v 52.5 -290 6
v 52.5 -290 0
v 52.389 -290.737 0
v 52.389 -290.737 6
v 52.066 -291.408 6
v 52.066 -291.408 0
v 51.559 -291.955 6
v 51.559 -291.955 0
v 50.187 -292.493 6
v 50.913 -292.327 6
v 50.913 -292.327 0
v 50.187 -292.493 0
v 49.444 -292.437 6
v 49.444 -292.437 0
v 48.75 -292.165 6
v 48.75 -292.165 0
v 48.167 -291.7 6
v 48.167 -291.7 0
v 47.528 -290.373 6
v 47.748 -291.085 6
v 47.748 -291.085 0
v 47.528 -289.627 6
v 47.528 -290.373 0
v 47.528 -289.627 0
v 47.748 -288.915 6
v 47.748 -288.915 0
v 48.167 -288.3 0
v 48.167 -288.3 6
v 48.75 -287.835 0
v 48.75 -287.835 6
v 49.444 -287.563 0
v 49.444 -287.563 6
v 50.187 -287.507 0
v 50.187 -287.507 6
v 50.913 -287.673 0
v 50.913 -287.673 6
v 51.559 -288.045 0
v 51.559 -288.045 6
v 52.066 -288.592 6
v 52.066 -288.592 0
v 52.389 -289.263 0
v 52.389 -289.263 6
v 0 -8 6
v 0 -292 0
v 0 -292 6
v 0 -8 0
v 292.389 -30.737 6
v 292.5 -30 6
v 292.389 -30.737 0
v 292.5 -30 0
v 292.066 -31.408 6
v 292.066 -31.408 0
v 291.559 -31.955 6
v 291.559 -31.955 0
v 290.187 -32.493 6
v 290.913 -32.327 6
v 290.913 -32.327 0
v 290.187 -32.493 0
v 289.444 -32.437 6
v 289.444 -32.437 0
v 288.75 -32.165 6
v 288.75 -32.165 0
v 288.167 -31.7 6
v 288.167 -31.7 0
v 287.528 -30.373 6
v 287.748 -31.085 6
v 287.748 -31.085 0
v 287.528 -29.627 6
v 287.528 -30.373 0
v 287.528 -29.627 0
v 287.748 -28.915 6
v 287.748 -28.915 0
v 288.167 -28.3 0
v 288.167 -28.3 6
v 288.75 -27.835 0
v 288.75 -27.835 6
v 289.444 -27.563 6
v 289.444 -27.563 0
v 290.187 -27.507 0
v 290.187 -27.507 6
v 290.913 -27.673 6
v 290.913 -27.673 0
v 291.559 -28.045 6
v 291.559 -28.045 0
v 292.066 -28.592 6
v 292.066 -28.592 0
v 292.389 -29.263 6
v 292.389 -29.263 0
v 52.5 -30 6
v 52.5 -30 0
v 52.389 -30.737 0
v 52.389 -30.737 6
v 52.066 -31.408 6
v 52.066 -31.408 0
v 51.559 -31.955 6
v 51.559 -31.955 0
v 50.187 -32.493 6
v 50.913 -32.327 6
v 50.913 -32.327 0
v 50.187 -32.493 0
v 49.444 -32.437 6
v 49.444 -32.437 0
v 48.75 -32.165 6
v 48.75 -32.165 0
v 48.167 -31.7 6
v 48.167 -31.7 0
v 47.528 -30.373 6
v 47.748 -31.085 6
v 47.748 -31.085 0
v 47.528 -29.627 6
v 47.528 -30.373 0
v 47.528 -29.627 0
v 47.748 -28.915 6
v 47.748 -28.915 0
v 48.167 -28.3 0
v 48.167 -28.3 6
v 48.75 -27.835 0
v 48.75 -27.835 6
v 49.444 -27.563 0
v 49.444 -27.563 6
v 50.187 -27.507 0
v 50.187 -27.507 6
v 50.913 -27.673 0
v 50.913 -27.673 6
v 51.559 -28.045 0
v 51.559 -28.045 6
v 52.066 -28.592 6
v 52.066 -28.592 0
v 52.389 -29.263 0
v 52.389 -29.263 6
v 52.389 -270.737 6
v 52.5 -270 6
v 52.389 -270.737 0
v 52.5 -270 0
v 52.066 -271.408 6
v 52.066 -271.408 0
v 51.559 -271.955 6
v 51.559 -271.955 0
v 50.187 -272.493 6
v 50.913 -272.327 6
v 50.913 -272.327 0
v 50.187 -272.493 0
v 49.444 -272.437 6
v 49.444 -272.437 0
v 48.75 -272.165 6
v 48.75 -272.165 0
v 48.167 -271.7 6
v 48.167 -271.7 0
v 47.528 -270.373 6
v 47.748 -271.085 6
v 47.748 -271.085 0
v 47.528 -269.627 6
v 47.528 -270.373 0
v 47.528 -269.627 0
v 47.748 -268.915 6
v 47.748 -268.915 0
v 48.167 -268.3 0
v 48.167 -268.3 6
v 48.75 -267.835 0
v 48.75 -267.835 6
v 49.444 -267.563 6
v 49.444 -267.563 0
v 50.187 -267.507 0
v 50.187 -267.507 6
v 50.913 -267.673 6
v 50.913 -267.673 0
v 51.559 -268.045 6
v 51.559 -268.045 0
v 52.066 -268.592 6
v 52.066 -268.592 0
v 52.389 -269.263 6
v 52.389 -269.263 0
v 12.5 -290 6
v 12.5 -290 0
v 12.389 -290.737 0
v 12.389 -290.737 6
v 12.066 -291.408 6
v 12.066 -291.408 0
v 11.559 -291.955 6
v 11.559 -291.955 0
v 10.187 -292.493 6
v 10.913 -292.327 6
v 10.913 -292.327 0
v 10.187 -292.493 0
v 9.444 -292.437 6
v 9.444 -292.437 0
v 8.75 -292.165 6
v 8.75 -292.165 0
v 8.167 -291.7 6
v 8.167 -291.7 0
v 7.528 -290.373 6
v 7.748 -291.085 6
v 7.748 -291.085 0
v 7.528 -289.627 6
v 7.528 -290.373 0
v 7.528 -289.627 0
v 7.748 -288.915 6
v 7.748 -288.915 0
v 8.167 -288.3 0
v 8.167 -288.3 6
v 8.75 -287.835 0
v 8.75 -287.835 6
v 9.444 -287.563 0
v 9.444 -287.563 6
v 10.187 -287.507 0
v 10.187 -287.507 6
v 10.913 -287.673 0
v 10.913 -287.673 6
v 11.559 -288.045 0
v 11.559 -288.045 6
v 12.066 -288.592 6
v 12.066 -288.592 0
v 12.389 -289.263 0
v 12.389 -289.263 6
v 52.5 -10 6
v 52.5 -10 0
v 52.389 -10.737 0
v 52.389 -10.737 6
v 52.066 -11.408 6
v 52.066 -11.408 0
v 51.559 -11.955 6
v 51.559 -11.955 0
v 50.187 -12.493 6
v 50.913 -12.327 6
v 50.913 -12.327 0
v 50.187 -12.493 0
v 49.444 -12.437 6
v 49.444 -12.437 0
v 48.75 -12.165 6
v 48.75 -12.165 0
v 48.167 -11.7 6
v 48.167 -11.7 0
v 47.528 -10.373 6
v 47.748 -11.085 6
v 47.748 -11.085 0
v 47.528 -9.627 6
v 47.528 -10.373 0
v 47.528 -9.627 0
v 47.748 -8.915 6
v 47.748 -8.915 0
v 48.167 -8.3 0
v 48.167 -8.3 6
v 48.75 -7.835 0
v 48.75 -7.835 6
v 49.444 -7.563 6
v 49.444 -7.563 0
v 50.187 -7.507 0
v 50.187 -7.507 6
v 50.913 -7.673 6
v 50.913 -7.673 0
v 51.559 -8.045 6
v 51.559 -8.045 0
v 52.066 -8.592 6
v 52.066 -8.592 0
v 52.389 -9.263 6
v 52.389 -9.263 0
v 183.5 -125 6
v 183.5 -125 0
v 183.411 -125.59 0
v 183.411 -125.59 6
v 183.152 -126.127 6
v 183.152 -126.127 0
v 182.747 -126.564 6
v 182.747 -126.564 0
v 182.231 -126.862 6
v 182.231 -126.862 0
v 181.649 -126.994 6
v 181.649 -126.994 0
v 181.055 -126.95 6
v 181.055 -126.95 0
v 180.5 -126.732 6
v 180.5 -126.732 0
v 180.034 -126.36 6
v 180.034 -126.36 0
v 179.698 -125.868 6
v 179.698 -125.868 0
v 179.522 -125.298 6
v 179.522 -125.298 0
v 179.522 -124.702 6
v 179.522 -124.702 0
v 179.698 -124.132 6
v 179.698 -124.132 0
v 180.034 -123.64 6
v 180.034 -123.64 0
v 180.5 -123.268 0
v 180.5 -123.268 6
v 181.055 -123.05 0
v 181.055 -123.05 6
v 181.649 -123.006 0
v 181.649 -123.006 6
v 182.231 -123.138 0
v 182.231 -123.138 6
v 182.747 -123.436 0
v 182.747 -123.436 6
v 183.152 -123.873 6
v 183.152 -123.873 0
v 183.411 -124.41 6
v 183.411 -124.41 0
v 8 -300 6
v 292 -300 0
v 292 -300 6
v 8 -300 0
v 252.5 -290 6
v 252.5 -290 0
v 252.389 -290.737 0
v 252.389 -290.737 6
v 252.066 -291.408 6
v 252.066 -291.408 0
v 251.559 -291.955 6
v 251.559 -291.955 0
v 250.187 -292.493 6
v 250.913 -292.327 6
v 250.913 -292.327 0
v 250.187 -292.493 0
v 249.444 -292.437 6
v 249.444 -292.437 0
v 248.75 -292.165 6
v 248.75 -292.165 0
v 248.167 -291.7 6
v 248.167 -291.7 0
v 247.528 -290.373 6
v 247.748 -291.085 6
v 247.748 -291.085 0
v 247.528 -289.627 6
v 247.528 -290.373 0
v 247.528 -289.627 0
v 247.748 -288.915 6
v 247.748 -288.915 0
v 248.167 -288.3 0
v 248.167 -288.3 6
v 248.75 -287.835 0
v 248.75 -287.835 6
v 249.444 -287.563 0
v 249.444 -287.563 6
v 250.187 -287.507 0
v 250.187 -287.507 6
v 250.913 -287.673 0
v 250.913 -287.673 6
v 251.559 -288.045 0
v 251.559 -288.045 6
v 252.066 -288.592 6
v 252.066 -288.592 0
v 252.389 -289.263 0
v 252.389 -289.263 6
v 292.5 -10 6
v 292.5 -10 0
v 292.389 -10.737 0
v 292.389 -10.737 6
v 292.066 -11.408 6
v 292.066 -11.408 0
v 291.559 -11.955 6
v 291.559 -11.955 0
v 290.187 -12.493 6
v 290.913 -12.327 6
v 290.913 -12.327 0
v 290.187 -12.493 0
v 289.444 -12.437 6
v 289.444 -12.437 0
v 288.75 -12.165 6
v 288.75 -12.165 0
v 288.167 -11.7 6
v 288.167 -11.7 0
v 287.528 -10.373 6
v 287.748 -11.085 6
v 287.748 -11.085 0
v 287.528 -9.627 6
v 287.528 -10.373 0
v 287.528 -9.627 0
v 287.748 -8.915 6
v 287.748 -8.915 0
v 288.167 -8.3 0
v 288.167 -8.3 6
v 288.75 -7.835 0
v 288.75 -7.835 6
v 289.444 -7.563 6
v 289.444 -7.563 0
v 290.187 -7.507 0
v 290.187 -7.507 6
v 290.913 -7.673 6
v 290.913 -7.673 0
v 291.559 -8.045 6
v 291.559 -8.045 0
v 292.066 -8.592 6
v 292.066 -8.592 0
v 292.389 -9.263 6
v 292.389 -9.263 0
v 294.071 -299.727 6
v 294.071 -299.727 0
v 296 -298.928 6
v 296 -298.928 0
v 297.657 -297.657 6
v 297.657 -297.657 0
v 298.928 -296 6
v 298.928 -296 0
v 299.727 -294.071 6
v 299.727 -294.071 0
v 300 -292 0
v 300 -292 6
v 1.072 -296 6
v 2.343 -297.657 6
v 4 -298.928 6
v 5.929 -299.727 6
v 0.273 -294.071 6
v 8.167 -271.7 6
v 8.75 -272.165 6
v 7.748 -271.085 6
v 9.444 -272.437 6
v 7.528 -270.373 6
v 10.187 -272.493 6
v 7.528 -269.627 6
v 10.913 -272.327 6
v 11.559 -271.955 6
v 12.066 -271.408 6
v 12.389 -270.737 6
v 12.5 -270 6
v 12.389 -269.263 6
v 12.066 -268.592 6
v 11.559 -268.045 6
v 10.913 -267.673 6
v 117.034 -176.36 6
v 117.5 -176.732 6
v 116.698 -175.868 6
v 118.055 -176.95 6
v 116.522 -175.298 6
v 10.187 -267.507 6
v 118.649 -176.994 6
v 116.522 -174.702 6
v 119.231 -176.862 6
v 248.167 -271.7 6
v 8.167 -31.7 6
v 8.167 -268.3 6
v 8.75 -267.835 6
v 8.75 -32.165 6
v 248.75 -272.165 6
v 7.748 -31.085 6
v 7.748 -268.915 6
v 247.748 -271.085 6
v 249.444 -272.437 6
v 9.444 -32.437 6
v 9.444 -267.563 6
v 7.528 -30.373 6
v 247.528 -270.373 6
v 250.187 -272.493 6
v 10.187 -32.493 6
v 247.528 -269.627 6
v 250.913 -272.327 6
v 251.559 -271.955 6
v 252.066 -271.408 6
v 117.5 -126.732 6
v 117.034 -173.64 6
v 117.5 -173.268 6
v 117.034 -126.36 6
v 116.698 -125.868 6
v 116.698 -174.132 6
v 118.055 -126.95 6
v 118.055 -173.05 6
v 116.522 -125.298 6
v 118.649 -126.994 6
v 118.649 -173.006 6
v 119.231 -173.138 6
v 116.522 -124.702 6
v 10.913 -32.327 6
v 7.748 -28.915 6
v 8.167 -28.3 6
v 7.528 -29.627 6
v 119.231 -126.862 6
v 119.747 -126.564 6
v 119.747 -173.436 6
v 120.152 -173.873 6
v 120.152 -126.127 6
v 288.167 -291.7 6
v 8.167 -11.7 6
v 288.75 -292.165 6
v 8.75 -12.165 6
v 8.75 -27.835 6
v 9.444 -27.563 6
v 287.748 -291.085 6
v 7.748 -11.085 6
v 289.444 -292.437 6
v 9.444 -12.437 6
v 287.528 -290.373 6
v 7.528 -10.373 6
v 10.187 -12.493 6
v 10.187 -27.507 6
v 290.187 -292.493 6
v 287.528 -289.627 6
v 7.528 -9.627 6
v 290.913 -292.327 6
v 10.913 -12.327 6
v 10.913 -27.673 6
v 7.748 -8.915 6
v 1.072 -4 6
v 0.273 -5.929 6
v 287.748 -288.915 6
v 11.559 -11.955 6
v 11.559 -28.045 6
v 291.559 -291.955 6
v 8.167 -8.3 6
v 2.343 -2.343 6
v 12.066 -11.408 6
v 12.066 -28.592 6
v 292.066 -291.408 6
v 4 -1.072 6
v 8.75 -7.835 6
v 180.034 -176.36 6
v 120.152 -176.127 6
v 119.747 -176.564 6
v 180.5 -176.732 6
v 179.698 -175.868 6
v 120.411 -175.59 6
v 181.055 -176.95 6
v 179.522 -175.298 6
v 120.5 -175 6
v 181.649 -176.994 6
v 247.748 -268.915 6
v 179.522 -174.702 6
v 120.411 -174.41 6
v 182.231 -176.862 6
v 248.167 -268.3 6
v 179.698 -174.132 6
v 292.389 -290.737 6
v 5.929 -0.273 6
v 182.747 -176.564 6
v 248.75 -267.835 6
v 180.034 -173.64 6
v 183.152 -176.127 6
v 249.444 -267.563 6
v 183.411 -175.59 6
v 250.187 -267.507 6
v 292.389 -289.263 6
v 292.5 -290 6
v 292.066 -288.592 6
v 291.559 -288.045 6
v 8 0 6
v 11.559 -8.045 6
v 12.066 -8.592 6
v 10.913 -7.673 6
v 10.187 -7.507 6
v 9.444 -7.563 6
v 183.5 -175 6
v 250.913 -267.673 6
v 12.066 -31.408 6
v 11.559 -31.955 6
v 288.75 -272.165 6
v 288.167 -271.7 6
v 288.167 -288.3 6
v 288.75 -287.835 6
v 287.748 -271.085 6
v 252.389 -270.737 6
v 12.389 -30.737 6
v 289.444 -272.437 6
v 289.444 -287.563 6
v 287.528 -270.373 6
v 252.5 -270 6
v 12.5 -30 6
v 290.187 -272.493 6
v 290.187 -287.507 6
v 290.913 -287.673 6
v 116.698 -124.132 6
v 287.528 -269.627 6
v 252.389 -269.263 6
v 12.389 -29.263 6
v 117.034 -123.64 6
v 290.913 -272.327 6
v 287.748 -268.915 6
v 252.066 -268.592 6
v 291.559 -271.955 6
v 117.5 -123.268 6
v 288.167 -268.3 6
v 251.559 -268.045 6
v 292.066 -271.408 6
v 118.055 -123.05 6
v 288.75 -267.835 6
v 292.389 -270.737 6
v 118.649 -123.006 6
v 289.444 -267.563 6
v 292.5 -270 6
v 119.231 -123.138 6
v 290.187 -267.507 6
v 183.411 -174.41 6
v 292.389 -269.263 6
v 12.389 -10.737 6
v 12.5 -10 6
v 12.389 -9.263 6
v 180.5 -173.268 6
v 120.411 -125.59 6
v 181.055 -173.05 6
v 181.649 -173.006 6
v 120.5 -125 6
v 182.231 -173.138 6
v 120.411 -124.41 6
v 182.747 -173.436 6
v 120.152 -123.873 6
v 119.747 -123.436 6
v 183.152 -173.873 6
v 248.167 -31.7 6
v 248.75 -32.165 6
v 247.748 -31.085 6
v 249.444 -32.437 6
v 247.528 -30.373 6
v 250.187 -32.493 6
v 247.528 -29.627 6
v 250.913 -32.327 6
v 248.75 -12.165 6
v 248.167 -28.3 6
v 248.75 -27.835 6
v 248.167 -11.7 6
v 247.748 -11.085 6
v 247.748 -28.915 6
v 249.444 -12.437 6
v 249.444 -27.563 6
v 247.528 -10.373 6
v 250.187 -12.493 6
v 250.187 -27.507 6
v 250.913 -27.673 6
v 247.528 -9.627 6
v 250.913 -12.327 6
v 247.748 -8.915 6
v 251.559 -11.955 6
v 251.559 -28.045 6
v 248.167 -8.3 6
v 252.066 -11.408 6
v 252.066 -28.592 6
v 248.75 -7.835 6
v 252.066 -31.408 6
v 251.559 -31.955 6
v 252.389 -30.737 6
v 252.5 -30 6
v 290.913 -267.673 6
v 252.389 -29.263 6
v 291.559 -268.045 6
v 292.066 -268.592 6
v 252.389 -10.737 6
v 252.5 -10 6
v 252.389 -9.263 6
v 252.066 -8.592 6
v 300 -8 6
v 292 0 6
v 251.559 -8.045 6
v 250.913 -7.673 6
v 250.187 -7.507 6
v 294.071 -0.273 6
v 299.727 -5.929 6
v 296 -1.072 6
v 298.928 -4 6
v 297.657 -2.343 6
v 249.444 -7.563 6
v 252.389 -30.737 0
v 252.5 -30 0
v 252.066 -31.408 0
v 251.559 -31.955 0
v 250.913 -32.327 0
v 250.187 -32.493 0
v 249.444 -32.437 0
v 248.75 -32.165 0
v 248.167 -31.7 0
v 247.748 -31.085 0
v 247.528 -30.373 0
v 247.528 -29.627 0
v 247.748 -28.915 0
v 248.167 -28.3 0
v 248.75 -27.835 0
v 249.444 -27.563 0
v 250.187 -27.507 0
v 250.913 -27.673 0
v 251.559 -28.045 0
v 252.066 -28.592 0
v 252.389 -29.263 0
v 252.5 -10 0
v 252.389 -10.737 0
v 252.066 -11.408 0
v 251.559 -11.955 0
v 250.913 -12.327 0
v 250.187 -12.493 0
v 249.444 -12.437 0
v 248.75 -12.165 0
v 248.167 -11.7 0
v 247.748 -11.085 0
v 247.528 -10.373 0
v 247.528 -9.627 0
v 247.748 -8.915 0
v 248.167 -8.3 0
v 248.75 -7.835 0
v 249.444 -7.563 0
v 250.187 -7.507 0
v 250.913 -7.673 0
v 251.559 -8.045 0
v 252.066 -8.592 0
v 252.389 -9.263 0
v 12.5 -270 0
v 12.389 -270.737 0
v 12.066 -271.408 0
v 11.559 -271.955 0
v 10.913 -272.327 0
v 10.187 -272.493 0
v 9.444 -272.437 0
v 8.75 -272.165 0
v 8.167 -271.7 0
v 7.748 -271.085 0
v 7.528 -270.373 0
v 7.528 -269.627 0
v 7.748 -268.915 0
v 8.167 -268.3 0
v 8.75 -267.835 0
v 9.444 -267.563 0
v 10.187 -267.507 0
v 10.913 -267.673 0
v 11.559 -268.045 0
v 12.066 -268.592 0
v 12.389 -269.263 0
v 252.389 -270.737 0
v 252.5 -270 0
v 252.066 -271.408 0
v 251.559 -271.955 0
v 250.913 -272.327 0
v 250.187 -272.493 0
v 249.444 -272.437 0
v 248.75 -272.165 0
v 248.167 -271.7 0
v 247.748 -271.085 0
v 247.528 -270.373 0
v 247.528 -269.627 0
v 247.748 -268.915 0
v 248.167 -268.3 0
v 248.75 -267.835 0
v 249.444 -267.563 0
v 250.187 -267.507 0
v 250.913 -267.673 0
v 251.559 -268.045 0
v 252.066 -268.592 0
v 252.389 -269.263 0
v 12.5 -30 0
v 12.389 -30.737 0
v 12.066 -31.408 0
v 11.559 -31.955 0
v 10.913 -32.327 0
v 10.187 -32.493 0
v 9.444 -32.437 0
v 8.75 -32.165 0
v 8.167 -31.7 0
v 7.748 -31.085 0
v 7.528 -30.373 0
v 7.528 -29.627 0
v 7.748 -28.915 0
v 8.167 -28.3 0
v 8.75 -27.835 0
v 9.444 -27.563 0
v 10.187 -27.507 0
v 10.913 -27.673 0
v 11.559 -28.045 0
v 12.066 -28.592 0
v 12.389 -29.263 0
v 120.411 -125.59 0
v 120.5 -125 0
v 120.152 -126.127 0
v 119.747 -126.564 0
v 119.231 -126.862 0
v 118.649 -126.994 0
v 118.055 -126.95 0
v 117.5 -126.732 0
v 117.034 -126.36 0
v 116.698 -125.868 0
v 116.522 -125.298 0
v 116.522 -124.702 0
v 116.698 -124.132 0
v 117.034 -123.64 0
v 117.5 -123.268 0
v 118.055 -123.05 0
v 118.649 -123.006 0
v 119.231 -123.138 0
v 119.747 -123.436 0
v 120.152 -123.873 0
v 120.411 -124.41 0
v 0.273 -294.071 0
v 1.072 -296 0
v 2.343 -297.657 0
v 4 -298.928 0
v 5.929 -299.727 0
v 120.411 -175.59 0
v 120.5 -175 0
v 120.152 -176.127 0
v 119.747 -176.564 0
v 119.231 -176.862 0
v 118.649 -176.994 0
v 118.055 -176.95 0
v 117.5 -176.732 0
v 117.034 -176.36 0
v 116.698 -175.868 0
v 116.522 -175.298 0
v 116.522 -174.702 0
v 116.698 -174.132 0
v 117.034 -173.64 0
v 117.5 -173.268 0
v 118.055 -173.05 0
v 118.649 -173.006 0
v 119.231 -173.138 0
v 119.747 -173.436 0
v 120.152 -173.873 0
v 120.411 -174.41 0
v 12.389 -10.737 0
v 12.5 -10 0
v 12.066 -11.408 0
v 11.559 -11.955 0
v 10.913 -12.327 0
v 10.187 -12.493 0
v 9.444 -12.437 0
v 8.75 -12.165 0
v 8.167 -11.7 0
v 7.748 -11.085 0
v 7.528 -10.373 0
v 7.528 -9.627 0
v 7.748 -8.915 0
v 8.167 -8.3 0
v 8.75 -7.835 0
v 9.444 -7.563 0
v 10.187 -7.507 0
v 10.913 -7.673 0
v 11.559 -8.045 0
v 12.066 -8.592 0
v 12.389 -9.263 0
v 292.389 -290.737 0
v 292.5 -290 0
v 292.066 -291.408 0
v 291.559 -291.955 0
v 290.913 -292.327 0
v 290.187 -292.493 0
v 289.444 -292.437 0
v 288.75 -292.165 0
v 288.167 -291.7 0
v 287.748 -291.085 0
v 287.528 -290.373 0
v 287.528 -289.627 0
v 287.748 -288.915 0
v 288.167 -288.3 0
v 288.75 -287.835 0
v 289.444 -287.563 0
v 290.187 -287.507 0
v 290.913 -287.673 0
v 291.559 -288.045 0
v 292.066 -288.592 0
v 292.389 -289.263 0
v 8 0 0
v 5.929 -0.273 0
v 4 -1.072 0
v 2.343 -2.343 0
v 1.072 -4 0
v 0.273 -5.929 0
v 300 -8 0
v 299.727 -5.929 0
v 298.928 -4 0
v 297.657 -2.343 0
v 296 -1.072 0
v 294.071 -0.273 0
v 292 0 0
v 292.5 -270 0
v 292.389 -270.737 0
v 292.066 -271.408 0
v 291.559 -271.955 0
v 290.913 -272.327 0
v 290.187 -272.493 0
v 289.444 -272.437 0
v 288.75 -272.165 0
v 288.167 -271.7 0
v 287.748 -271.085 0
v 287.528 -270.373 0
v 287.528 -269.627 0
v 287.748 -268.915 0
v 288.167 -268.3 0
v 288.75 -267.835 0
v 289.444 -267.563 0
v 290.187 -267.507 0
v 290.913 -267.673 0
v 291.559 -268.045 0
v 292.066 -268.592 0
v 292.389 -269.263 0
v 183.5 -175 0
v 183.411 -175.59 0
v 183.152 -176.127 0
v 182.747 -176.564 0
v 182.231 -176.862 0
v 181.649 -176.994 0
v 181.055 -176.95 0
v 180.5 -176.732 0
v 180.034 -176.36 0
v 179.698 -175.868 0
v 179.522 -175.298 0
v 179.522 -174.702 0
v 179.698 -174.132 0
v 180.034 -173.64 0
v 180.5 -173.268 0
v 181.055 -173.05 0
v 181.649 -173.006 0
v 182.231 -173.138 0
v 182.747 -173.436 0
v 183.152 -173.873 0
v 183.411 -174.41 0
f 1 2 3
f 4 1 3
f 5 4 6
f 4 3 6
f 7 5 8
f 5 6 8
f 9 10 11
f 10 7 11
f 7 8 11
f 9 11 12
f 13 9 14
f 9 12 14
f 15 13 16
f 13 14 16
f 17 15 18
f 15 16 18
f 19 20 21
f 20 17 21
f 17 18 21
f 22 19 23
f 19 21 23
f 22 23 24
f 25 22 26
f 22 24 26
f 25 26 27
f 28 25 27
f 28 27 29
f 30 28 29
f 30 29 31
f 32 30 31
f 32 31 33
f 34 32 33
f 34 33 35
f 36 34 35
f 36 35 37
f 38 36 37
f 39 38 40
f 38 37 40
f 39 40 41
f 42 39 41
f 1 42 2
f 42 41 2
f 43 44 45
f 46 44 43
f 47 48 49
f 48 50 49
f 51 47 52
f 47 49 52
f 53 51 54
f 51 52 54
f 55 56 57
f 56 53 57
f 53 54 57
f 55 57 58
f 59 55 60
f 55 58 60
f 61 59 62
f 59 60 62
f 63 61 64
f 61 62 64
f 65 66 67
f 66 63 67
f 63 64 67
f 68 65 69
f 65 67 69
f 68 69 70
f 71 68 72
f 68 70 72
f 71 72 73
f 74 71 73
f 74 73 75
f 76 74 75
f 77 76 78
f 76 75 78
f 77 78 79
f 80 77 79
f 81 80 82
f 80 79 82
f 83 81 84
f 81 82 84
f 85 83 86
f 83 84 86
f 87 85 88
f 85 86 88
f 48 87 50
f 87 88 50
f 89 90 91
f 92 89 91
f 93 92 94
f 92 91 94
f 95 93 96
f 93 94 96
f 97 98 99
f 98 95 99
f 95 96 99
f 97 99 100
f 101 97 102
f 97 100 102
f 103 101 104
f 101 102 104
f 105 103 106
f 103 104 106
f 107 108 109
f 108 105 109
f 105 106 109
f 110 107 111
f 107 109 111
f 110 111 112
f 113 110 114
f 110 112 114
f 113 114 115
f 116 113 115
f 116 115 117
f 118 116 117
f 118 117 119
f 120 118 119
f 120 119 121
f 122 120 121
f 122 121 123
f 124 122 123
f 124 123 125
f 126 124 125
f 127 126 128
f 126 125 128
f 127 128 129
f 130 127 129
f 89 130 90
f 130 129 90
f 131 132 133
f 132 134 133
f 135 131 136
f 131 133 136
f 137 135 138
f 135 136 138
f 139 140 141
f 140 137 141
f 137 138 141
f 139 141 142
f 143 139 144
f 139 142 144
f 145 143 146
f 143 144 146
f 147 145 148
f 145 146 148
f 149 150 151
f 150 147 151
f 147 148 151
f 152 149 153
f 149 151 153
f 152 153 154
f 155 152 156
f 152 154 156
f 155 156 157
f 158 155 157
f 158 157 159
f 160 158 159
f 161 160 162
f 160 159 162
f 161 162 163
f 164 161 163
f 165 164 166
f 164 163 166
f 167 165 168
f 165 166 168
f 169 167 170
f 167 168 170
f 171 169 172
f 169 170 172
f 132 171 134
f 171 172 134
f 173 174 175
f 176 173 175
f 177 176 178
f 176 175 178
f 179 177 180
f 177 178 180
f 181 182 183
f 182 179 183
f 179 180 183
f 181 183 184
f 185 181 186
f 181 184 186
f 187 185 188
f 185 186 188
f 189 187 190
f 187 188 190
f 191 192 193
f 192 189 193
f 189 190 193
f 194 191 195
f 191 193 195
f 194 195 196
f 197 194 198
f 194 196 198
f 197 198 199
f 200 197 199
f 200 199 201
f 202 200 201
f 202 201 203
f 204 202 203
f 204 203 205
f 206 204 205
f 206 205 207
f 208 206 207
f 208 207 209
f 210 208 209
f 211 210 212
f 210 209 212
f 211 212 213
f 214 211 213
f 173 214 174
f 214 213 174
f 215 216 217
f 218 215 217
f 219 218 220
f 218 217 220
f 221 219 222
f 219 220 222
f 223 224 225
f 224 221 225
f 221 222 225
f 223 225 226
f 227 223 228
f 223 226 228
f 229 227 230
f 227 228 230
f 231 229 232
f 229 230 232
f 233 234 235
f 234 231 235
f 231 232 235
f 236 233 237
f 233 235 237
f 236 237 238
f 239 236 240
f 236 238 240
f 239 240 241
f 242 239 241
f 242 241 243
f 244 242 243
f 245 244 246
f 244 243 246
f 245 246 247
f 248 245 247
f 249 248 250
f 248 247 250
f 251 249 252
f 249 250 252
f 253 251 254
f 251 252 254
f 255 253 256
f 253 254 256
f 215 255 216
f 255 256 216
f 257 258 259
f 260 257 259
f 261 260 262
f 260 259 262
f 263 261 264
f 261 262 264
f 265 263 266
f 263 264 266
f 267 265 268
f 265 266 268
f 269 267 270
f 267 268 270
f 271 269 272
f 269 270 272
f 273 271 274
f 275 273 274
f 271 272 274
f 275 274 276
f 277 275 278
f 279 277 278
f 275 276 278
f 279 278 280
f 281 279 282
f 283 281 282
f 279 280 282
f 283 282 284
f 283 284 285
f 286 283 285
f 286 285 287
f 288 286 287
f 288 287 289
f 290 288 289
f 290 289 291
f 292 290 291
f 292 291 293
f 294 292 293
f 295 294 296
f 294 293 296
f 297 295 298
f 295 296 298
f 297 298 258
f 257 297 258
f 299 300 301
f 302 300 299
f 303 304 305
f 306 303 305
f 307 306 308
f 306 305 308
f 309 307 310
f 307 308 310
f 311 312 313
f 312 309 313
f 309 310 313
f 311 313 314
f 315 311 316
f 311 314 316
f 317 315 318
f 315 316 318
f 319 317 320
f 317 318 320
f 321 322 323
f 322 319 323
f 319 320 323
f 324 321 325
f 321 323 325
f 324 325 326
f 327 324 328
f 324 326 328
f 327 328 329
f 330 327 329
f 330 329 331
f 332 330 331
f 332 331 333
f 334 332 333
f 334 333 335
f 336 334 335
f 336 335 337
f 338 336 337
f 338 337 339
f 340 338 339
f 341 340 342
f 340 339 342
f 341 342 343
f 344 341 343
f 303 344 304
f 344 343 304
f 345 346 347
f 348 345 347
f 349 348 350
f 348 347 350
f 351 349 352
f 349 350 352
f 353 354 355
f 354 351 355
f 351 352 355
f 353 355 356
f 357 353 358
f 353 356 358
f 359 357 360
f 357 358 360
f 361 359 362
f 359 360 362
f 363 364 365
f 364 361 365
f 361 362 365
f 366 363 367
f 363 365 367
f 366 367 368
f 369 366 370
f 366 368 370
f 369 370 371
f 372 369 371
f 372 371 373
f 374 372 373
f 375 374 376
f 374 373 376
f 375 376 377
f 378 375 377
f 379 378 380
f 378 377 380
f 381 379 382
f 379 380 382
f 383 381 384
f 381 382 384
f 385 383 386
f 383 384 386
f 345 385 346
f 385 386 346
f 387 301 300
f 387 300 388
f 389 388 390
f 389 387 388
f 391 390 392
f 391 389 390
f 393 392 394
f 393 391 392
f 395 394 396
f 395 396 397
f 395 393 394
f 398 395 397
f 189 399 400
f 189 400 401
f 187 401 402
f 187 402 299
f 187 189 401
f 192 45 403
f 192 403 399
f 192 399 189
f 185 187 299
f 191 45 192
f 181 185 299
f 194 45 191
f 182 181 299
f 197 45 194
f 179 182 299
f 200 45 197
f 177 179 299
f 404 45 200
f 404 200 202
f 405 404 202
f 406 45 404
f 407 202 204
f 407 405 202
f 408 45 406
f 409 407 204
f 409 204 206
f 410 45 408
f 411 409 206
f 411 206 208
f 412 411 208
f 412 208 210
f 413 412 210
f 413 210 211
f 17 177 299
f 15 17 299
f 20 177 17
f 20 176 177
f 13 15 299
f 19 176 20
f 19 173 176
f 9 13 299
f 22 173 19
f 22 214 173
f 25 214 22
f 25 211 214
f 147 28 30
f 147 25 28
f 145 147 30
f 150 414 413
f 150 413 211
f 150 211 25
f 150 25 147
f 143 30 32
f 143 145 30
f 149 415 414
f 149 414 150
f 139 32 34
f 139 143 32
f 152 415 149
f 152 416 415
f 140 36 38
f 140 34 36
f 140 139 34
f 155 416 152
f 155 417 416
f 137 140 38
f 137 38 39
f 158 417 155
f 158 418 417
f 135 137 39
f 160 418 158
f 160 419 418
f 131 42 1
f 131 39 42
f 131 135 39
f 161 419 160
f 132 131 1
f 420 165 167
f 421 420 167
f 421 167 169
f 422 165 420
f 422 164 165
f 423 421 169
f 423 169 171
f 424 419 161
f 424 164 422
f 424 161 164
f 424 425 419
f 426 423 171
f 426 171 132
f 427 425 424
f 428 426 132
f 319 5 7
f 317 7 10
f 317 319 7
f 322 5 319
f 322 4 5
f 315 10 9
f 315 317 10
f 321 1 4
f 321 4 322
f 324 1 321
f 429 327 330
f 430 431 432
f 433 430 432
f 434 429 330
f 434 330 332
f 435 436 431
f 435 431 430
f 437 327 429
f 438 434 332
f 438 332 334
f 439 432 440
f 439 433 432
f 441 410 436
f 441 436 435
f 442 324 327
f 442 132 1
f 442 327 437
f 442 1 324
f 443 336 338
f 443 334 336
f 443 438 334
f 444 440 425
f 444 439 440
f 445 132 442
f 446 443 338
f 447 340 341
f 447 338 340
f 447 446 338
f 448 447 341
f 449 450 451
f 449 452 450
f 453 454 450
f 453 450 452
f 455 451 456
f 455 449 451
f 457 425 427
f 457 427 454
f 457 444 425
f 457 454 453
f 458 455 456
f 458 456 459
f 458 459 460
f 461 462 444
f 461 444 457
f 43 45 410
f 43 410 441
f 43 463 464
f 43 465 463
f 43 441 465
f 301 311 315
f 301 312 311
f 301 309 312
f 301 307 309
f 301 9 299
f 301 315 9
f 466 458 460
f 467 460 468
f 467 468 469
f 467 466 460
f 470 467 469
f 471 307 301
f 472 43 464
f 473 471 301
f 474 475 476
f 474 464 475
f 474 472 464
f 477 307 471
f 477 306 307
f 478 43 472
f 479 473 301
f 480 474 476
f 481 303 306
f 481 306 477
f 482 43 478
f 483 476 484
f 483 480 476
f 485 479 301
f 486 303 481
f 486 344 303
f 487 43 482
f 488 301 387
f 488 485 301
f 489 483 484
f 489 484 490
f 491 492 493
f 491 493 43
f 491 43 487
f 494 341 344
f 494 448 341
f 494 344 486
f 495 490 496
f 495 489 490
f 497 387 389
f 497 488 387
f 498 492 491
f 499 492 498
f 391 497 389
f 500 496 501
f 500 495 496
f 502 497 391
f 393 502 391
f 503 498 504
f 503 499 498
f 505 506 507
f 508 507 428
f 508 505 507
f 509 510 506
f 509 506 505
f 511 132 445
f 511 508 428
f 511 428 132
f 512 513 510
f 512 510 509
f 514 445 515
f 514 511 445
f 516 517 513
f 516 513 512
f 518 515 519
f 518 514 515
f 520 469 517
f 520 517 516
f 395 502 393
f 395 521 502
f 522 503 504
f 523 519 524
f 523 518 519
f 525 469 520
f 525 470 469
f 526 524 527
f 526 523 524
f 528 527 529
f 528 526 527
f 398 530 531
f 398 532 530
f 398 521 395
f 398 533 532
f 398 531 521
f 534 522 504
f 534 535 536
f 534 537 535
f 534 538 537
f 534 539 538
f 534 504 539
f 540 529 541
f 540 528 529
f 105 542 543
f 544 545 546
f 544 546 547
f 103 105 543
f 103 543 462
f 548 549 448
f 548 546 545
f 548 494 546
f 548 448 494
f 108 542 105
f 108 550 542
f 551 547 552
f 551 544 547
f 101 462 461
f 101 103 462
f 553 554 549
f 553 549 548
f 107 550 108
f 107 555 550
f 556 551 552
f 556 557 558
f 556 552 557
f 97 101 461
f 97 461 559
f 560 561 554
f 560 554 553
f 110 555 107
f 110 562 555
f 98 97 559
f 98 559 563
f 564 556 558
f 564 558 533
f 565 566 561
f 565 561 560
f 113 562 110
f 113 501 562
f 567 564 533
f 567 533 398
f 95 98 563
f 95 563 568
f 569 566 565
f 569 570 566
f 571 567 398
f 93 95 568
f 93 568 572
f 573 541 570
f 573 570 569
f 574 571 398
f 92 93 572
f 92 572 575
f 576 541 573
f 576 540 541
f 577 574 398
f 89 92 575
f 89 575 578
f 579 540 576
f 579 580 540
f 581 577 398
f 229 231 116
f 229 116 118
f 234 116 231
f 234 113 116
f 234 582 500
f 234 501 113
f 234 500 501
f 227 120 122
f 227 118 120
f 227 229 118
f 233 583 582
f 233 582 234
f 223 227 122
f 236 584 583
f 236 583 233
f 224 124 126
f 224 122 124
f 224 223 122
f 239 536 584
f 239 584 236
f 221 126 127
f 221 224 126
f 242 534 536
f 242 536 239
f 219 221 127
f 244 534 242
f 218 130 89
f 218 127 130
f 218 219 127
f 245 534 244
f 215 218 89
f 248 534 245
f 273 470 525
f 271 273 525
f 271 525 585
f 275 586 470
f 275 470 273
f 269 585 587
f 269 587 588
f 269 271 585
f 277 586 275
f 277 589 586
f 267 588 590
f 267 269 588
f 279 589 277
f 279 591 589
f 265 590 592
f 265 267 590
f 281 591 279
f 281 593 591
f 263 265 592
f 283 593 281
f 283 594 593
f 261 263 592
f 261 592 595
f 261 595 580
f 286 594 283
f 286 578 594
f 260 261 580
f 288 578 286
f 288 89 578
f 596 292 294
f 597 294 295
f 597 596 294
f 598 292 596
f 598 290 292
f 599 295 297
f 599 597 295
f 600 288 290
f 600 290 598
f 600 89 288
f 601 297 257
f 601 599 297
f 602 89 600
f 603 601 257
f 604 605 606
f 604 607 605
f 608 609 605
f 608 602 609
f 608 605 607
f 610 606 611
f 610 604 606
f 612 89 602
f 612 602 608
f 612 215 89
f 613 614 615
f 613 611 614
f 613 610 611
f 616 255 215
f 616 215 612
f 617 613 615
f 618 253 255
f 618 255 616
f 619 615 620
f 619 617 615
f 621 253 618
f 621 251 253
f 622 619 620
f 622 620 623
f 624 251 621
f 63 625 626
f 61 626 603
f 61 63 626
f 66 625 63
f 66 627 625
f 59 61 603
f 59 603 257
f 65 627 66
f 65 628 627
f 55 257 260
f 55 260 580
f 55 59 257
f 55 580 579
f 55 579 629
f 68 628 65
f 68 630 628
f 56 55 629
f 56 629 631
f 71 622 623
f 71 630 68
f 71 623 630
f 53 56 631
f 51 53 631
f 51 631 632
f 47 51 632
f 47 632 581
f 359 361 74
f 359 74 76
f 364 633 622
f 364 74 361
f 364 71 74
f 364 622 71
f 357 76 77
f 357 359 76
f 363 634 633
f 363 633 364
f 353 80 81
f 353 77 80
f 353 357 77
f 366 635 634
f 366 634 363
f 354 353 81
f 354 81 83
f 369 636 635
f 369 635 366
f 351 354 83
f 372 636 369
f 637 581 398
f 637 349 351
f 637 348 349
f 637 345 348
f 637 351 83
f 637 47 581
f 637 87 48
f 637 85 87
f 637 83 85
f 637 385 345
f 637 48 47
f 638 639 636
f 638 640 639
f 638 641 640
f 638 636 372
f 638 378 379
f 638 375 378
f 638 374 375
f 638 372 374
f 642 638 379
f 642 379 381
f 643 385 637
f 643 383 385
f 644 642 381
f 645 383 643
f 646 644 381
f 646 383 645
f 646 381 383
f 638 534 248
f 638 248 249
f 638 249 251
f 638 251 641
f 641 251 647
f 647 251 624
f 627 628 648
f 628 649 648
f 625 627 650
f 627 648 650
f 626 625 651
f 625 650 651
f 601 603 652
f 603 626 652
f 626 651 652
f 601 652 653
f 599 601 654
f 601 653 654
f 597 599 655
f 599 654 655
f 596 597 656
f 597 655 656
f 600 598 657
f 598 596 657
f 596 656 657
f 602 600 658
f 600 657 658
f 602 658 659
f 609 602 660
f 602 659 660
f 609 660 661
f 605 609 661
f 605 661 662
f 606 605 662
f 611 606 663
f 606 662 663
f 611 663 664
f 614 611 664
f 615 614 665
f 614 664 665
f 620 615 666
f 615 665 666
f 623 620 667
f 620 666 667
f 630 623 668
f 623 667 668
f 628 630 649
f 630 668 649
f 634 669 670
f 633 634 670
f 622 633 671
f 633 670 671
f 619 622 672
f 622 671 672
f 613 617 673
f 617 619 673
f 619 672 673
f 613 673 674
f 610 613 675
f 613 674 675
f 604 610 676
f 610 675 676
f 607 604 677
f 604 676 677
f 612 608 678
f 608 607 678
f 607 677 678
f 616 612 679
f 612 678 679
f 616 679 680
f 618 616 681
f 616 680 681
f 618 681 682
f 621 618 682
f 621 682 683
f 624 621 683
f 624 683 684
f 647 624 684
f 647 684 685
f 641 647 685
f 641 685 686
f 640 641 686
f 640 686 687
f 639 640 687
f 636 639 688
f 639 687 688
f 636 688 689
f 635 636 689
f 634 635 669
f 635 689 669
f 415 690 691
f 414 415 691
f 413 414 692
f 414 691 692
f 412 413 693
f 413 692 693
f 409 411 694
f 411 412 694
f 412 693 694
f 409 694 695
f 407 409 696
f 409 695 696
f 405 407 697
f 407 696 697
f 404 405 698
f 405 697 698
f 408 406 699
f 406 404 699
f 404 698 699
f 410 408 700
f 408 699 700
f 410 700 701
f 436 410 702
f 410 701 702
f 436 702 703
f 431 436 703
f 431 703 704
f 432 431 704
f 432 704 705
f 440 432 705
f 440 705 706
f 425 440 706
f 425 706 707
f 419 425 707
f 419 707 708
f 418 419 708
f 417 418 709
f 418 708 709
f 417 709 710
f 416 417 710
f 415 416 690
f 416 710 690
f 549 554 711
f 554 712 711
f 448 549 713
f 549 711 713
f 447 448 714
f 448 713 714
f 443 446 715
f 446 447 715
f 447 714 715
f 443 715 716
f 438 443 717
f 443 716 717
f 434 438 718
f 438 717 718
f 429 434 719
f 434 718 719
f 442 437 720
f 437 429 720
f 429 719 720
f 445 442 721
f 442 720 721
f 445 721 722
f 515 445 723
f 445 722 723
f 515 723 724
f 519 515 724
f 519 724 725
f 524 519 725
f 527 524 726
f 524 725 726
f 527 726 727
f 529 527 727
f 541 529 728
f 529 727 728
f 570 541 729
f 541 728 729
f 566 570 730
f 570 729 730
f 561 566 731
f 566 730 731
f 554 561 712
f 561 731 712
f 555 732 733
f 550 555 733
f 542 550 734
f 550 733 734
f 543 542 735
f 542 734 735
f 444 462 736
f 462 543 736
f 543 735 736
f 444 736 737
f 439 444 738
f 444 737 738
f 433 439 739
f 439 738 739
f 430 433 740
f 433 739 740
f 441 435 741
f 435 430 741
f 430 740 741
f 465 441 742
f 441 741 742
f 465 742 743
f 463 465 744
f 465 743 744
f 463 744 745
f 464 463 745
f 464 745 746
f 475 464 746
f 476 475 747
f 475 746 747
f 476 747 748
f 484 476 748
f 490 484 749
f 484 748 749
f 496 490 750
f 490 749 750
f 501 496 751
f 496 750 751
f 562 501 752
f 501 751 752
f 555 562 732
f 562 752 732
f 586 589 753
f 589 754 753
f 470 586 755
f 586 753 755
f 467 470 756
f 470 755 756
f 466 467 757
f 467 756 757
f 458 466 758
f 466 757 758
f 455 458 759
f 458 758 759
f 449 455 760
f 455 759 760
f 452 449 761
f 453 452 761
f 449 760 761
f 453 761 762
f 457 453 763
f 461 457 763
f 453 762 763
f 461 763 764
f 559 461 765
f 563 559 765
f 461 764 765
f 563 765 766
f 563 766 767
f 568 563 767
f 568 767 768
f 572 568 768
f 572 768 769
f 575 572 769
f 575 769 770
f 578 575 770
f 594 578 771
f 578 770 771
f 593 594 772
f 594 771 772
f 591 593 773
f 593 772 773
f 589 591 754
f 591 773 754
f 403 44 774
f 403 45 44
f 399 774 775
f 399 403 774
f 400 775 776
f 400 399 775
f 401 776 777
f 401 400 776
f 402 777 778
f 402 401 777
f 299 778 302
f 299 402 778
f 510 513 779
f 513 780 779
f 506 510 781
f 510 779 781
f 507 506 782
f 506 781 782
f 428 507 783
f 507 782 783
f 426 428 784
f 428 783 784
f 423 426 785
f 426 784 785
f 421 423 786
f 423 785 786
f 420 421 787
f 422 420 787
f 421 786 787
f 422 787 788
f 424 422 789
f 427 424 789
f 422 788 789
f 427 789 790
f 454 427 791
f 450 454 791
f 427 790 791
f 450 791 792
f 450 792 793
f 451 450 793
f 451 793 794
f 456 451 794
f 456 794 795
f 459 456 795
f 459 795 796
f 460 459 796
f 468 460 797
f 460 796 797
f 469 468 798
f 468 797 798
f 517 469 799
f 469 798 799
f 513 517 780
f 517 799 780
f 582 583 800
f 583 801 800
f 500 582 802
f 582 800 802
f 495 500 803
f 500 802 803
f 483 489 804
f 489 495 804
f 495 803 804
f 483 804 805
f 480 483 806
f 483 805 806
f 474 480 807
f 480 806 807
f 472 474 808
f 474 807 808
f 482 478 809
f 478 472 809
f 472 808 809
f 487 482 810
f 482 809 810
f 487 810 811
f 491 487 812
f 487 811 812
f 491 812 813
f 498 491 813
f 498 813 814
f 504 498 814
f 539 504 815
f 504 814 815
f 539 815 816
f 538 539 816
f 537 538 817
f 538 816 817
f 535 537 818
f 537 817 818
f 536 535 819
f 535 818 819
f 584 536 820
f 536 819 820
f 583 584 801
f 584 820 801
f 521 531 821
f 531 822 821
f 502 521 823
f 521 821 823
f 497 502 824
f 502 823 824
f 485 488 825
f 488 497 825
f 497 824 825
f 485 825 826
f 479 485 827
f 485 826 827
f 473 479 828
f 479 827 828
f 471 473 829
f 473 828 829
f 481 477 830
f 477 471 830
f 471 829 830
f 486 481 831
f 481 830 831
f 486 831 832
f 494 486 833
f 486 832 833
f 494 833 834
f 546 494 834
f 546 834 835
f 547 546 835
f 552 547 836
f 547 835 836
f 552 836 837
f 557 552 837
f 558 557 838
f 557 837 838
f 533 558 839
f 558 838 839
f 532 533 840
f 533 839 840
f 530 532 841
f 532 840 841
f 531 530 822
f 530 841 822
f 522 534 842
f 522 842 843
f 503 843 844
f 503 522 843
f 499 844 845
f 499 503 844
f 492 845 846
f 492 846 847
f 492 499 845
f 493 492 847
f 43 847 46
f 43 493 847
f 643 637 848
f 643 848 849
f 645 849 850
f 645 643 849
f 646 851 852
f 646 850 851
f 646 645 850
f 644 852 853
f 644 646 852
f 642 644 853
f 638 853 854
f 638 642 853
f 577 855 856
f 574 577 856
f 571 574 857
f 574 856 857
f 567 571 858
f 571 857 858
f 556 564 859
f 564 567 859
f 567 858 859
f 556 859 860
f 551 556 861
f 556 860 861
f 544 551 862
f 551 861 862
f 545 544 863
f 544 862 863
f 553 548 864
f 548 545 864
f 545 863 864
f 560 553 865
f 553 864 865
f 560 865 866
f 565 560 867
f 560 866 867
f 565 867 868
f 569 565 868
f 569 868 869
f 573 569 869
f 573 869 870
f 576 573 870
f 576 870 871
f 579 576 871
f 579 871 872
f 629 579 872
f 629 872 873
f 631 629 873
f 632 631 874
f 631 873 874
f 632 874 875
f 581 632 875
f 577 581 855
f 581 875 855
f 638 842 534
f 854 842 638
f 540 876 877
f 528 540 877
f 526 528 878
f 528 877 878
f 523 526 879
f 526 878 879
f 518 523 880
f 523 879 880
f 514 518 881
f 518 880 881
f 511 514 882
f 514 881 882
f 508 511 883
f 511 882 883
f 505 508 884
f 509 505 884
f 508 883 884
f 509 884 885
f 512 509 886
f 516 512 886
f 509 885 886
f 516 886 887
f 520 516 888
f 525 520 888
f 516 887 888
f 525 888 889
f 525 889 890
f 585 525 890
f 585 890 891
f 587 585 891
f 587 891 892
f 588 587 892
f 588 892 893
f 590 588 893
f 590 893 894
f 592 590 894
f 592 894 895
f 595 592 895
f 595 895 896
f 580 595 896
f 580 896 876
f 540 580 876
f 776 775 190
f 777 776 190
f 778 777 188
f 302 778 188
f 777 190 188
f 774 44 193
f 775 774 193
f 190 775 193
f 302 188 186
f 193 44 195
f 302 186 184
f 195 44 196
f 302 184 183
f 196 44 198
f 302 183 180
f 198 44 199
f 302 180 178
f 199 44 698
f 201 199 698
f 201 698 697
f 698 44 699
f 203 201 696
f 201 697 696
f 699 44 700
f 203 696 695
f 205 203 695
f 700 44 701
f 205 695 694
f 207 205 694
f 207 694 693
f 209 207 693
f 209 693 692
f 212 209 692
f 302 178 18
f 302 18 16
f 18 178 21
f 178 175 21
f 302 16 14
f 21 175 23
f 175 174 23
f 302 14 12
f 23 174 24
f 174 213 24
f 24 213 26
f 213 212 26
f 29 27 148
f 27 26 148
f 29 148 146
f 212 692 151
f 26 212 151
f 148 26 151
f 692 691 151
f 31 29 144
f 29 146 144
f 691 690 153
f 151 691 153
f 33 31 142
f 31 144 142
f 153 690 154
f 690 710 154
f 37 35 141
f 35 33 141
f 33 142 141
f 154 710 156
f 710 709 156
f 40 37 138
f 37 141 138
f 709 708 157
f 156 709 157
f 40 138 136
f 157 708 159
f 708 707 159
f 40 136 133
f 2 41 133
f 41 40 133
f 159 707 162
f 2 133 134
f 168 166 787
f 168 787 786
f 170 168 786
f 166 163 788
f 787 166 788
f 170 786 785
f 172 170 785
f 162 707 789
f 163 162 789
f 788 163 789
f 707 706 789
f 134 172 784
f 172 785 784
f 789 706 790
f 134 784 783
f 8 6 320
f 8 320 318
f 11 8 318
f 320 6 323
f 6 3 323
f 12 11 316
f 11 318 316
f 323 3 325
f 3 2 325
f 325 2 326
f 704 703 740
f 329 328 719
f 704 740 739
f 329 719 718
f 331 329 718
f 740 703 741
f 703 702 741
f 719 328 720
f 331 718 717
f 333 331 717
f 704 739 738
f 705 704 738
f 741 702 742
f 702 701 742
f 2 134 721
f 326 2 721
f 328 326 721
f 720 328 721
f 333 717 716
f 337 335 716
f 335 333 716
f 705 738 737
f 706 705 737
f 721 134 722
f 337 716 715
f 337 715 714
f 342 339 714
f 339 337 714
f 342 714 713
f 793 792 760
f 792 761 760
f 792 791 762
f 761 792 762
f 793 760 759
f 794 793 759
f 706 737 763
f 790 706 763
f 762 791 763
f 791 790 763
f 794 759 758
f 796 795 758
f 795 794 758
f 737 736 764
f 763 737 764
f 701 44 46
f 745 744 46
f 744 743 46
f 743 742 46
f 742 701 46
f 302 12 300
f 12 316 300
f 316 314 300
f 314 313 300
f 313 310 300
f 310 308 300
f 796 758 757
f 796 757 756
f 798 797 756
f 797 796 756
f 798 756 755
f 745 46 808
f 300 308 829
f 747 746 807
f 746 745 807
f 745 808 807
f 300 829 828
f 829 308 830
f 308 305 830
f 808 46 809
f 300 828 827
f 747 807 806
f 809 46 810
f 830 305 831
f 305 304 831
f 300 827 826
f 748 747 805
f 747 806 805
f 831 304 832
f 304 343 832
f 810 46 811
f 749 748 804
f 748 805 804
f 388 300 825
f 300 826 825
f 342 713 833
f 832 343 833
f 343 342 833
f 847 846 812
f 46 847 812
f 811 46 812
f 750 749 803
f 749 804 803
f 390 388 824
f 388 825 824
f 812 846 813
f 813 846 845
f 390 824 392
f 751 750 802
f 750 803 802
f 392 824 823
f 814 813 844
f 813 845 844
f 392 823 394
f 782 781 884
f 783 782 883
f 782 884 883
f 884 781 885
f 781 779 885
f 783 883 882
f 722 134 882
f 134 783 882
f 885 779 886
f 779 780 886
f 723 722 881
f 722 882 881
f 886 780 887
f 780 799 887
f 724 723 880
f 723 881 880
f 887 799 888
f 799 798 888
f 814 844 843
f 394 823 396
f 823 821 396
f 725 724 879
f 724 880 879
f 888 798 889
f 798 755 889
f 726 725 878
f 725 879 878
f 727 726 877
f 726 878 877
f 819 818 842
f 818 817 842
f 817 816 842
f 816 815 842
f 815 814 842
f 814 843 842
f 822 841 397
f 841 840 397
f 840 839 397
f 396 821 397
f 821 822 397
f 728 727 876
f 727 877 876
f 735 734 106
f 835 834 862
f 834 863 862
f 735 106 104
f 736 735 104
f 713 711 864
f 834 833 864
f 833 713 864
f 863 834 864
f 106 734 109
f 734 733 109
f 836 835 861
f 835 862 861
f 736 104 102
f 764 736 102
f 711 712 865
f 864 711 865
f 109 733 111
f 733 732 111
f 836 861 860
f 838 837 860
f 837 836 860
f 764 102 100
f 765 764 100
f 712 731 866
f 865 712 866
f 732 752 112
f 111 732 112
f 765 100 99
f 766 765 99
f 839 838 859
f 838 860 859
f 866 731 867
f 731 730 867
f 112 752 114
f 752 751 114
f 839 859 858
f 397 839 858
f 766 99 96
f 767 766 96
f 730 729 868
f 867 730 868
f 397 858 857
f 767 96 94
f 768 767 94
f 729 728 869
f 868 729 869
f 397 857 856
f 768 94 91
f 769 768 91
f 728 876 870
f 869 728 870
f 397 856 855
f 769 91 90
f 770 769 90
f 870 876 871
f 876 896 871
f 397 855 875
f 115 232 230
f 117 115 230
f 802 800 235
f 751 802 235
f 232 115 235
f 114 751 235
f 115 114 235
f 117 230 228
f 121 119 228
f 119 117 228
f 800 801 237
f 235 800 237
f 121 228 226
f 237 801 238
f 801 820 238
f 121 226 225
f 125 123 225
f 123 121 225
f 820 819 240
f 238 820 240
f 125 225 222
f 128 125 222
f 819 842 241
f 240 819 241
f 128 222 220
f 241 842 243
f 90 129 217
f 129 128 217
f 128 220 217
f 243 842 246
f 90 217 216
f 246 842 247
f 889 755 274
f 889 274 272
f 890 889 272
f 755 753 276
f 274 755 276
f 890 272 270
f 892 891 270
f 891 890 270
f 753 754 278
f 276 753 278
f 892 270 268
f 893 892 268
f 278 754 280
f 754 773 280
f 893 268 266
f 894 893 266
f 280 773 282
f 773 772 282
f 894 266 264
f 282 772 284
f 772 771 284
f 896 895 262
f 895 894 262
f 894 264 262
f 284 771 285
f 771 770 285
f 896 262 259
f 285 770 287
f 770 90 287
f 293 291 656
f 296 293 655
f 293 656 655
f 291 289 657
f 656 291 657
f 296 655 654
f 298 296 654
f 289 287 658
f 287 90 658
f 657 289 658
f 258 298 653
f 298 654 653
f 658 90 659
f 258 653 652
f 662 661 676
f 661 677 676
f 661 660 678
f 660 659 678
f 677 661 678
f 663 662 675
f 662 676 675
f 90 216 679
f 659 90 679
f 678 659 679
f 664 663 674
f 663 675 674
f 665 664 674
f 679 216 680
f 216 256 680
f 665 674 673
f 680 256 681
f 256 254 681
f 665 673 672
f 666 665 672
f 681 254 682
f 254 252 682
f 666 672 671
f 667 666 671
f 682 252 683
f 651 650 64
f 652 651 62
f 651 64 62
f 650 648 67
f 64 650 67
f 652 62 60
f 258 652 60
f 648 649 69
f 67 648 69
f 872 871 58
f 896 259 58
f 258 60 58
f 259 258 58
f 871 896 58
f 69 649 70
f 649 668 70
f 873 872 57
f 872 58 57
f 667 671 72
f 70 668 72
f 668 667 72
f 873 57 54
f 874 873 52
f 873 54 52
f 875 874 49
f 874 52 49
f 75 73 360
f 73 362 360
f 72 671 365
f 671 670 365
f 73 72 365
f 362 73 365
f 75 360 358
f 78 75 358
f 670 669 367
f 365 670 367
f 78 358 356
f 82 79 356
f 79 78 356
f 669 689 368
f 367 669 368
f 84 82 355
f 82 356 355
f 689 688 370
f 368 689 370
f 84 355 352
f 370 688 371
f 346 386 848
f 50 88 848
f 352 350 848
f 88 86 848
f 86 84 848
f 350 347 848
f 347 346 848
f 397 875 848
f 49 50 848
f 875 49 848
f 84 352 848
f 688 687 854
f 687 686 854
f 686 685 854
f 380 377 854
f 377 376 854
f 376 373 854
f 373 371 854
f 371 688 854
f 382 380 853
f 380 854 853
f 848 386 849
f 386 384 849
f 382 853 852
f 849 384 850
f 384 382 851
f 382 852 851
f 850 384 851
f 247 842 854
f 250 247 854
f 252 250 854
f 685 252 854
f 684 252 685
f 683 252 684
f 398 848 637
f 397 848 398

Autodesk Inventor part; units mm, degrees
ref_plane "YZ Plane" through (0, 0, 0) normal (1, 0, 0) x (0, 1, 0)
ref_plane "XZ Plane" through (0, 0, 0) normal (0, 1, 0) x (-1, 0, 0)
ref_plane "XY Plane" through (0, 0, 0) normal (0, 0, 1) x (1, 0, 0)
sketch "Sketch1" plane through (0, 0, 0) normal (0, 0, 1) x (1, 0, 0)
  line L0 (0, 0) -> (300, 0)
  line L1 (300, 0) -> (300, -300)
  line L2 (300, -300) -> (0, -300)
  line L3 (0, -300) -> (0, 0)
  circle A0 centre (118.5, -125) radius 2
  circle A1 centre (118.5, -175) radius 2
  circle A2 centre (181.5, -175) radius 2
  circle A3 centre (181.5, -125) radius 2
  line L4 (118.5, -125) -> (118.5, -175)
  line L5 (118.5, -125) -> (181.5, -125)
  line L6 (118.5, -175) -> (181.5, -175)
  line L7 (181.5, -125) -> (181.5, -175)
  circle A4 centre (290, -10) radius 2.5
  circle A5 centre (290, -30) radius 2.5
  circle A6 centre (250, -30) radius 2.5
  circle A7 centre (250, -10) radius 2.5
  line L8 (300, -6.9) -> (223, -6.9)
  line L9 (300, -13.1) -> (223, -13.1)
  line L10 (300, -33.1) -> (223, -33.1)
  line L11 (300, -26.9) -> (223, -26.9)
  line L12 (300, -40) -> (222.6975, -40)
  line L13 (240, 0) -> (240, -40)
  circle A8 centre (290, -270) radius 2.5
  circle A9 centre (290, -290) radius 2.5
  circle A10 centre (250, -290) radius 2.5
  circle A11 centre (250, -270) radius 2.5
  circle A12 centre (50, -270) radius 2.5
  circle A13 centre (50, -290) radius 2.5
  circle A14 centre (10, -290) radius 2.5
  circle A15 centre (10, -270) radius 2.5
  circle A16 centre (50, -10) radius 2.5
  circle A17 centre (50, -30) radius 2.5
  circle A18 centre (10, -30) radius 2.5
  circle A19 centre (10, -10) radius 2.5
  dimension "d29" = 50
  dimension "d31" = 50
  dimension "d33" = 300
  dimension "d34" = 300
  dimension "d35" = 118.5
  dimension "d36" = 125
  dimension "d37" = 63
  dimension "d38" = 5
  dimension "d39" = 5
  dimension "d40" = 5
  dimension "d41" = 5
  dimension "d42" = 6.2
  dimension "d43" = 6.9
  dimension "d44" = 10
  dimension "d45" = 10
  dimension "d46" = 10
  dimension "d47" = 10
  dimension "d48" = 10
  dimension "d49" = 40
  dimension "d50" = 40
  dimension "d51" = 10
  dimension "d58" = 10
  dimension "d59" = 40
  dimension "d60" = 5
  dimension "d61" = 5
  dimension "d62" = 5
  dimension "d63" = 5
  dimension "d64" = 40
  dimension "d65" = 40
  dimension "d66" = 5
  dimension "d67" = 5
  dimension "d68" = 5
  dimension "d69" = 5
  dimension "d70" = 40
  dimension "d71" = 40
  dimension "d72" = 5
  dimension "d73" = 5
  dimension "d74" = 5
  dimension "d75" = 5
  dimension "d76" = 40
  dimension "d77" = 40
extrude "Extrusion1" add sketch "Sketch1" along normal blind 6 contours L0 L13 L12 L1 L2 L3 | L0 L1 L8 L13 | L8 L1 L9 L13 | L9 L1 L11 L13 | L12 L13 L10 L1 | L11 L1 L10 L13 | L5 A3 L7 A2 L6 A1 L4 A0
fillet "Fillet1" radius 8 4 edges at (0, -300, 3) (300, -300, 3) (300, 0, 3) (0, 0, 3)
equation "\"d29\" = d31"
equation "\"d35\" = -0.5 * d37 + 0.5 * d34"
equation "\"d36\" = -0.5 * d29 + 0.5 * d33"
equation "\"d39\" = d38"
equation "\"d40\" = d38"
equation "\"d41\" = d38"
equation "\"d18\" = -0.5 * d12 + 0.5 * d1"
equation "\"d12\" = 74"
equation "\"d1\" = 170"
properties part number "BaseC_1" material "Steel"
